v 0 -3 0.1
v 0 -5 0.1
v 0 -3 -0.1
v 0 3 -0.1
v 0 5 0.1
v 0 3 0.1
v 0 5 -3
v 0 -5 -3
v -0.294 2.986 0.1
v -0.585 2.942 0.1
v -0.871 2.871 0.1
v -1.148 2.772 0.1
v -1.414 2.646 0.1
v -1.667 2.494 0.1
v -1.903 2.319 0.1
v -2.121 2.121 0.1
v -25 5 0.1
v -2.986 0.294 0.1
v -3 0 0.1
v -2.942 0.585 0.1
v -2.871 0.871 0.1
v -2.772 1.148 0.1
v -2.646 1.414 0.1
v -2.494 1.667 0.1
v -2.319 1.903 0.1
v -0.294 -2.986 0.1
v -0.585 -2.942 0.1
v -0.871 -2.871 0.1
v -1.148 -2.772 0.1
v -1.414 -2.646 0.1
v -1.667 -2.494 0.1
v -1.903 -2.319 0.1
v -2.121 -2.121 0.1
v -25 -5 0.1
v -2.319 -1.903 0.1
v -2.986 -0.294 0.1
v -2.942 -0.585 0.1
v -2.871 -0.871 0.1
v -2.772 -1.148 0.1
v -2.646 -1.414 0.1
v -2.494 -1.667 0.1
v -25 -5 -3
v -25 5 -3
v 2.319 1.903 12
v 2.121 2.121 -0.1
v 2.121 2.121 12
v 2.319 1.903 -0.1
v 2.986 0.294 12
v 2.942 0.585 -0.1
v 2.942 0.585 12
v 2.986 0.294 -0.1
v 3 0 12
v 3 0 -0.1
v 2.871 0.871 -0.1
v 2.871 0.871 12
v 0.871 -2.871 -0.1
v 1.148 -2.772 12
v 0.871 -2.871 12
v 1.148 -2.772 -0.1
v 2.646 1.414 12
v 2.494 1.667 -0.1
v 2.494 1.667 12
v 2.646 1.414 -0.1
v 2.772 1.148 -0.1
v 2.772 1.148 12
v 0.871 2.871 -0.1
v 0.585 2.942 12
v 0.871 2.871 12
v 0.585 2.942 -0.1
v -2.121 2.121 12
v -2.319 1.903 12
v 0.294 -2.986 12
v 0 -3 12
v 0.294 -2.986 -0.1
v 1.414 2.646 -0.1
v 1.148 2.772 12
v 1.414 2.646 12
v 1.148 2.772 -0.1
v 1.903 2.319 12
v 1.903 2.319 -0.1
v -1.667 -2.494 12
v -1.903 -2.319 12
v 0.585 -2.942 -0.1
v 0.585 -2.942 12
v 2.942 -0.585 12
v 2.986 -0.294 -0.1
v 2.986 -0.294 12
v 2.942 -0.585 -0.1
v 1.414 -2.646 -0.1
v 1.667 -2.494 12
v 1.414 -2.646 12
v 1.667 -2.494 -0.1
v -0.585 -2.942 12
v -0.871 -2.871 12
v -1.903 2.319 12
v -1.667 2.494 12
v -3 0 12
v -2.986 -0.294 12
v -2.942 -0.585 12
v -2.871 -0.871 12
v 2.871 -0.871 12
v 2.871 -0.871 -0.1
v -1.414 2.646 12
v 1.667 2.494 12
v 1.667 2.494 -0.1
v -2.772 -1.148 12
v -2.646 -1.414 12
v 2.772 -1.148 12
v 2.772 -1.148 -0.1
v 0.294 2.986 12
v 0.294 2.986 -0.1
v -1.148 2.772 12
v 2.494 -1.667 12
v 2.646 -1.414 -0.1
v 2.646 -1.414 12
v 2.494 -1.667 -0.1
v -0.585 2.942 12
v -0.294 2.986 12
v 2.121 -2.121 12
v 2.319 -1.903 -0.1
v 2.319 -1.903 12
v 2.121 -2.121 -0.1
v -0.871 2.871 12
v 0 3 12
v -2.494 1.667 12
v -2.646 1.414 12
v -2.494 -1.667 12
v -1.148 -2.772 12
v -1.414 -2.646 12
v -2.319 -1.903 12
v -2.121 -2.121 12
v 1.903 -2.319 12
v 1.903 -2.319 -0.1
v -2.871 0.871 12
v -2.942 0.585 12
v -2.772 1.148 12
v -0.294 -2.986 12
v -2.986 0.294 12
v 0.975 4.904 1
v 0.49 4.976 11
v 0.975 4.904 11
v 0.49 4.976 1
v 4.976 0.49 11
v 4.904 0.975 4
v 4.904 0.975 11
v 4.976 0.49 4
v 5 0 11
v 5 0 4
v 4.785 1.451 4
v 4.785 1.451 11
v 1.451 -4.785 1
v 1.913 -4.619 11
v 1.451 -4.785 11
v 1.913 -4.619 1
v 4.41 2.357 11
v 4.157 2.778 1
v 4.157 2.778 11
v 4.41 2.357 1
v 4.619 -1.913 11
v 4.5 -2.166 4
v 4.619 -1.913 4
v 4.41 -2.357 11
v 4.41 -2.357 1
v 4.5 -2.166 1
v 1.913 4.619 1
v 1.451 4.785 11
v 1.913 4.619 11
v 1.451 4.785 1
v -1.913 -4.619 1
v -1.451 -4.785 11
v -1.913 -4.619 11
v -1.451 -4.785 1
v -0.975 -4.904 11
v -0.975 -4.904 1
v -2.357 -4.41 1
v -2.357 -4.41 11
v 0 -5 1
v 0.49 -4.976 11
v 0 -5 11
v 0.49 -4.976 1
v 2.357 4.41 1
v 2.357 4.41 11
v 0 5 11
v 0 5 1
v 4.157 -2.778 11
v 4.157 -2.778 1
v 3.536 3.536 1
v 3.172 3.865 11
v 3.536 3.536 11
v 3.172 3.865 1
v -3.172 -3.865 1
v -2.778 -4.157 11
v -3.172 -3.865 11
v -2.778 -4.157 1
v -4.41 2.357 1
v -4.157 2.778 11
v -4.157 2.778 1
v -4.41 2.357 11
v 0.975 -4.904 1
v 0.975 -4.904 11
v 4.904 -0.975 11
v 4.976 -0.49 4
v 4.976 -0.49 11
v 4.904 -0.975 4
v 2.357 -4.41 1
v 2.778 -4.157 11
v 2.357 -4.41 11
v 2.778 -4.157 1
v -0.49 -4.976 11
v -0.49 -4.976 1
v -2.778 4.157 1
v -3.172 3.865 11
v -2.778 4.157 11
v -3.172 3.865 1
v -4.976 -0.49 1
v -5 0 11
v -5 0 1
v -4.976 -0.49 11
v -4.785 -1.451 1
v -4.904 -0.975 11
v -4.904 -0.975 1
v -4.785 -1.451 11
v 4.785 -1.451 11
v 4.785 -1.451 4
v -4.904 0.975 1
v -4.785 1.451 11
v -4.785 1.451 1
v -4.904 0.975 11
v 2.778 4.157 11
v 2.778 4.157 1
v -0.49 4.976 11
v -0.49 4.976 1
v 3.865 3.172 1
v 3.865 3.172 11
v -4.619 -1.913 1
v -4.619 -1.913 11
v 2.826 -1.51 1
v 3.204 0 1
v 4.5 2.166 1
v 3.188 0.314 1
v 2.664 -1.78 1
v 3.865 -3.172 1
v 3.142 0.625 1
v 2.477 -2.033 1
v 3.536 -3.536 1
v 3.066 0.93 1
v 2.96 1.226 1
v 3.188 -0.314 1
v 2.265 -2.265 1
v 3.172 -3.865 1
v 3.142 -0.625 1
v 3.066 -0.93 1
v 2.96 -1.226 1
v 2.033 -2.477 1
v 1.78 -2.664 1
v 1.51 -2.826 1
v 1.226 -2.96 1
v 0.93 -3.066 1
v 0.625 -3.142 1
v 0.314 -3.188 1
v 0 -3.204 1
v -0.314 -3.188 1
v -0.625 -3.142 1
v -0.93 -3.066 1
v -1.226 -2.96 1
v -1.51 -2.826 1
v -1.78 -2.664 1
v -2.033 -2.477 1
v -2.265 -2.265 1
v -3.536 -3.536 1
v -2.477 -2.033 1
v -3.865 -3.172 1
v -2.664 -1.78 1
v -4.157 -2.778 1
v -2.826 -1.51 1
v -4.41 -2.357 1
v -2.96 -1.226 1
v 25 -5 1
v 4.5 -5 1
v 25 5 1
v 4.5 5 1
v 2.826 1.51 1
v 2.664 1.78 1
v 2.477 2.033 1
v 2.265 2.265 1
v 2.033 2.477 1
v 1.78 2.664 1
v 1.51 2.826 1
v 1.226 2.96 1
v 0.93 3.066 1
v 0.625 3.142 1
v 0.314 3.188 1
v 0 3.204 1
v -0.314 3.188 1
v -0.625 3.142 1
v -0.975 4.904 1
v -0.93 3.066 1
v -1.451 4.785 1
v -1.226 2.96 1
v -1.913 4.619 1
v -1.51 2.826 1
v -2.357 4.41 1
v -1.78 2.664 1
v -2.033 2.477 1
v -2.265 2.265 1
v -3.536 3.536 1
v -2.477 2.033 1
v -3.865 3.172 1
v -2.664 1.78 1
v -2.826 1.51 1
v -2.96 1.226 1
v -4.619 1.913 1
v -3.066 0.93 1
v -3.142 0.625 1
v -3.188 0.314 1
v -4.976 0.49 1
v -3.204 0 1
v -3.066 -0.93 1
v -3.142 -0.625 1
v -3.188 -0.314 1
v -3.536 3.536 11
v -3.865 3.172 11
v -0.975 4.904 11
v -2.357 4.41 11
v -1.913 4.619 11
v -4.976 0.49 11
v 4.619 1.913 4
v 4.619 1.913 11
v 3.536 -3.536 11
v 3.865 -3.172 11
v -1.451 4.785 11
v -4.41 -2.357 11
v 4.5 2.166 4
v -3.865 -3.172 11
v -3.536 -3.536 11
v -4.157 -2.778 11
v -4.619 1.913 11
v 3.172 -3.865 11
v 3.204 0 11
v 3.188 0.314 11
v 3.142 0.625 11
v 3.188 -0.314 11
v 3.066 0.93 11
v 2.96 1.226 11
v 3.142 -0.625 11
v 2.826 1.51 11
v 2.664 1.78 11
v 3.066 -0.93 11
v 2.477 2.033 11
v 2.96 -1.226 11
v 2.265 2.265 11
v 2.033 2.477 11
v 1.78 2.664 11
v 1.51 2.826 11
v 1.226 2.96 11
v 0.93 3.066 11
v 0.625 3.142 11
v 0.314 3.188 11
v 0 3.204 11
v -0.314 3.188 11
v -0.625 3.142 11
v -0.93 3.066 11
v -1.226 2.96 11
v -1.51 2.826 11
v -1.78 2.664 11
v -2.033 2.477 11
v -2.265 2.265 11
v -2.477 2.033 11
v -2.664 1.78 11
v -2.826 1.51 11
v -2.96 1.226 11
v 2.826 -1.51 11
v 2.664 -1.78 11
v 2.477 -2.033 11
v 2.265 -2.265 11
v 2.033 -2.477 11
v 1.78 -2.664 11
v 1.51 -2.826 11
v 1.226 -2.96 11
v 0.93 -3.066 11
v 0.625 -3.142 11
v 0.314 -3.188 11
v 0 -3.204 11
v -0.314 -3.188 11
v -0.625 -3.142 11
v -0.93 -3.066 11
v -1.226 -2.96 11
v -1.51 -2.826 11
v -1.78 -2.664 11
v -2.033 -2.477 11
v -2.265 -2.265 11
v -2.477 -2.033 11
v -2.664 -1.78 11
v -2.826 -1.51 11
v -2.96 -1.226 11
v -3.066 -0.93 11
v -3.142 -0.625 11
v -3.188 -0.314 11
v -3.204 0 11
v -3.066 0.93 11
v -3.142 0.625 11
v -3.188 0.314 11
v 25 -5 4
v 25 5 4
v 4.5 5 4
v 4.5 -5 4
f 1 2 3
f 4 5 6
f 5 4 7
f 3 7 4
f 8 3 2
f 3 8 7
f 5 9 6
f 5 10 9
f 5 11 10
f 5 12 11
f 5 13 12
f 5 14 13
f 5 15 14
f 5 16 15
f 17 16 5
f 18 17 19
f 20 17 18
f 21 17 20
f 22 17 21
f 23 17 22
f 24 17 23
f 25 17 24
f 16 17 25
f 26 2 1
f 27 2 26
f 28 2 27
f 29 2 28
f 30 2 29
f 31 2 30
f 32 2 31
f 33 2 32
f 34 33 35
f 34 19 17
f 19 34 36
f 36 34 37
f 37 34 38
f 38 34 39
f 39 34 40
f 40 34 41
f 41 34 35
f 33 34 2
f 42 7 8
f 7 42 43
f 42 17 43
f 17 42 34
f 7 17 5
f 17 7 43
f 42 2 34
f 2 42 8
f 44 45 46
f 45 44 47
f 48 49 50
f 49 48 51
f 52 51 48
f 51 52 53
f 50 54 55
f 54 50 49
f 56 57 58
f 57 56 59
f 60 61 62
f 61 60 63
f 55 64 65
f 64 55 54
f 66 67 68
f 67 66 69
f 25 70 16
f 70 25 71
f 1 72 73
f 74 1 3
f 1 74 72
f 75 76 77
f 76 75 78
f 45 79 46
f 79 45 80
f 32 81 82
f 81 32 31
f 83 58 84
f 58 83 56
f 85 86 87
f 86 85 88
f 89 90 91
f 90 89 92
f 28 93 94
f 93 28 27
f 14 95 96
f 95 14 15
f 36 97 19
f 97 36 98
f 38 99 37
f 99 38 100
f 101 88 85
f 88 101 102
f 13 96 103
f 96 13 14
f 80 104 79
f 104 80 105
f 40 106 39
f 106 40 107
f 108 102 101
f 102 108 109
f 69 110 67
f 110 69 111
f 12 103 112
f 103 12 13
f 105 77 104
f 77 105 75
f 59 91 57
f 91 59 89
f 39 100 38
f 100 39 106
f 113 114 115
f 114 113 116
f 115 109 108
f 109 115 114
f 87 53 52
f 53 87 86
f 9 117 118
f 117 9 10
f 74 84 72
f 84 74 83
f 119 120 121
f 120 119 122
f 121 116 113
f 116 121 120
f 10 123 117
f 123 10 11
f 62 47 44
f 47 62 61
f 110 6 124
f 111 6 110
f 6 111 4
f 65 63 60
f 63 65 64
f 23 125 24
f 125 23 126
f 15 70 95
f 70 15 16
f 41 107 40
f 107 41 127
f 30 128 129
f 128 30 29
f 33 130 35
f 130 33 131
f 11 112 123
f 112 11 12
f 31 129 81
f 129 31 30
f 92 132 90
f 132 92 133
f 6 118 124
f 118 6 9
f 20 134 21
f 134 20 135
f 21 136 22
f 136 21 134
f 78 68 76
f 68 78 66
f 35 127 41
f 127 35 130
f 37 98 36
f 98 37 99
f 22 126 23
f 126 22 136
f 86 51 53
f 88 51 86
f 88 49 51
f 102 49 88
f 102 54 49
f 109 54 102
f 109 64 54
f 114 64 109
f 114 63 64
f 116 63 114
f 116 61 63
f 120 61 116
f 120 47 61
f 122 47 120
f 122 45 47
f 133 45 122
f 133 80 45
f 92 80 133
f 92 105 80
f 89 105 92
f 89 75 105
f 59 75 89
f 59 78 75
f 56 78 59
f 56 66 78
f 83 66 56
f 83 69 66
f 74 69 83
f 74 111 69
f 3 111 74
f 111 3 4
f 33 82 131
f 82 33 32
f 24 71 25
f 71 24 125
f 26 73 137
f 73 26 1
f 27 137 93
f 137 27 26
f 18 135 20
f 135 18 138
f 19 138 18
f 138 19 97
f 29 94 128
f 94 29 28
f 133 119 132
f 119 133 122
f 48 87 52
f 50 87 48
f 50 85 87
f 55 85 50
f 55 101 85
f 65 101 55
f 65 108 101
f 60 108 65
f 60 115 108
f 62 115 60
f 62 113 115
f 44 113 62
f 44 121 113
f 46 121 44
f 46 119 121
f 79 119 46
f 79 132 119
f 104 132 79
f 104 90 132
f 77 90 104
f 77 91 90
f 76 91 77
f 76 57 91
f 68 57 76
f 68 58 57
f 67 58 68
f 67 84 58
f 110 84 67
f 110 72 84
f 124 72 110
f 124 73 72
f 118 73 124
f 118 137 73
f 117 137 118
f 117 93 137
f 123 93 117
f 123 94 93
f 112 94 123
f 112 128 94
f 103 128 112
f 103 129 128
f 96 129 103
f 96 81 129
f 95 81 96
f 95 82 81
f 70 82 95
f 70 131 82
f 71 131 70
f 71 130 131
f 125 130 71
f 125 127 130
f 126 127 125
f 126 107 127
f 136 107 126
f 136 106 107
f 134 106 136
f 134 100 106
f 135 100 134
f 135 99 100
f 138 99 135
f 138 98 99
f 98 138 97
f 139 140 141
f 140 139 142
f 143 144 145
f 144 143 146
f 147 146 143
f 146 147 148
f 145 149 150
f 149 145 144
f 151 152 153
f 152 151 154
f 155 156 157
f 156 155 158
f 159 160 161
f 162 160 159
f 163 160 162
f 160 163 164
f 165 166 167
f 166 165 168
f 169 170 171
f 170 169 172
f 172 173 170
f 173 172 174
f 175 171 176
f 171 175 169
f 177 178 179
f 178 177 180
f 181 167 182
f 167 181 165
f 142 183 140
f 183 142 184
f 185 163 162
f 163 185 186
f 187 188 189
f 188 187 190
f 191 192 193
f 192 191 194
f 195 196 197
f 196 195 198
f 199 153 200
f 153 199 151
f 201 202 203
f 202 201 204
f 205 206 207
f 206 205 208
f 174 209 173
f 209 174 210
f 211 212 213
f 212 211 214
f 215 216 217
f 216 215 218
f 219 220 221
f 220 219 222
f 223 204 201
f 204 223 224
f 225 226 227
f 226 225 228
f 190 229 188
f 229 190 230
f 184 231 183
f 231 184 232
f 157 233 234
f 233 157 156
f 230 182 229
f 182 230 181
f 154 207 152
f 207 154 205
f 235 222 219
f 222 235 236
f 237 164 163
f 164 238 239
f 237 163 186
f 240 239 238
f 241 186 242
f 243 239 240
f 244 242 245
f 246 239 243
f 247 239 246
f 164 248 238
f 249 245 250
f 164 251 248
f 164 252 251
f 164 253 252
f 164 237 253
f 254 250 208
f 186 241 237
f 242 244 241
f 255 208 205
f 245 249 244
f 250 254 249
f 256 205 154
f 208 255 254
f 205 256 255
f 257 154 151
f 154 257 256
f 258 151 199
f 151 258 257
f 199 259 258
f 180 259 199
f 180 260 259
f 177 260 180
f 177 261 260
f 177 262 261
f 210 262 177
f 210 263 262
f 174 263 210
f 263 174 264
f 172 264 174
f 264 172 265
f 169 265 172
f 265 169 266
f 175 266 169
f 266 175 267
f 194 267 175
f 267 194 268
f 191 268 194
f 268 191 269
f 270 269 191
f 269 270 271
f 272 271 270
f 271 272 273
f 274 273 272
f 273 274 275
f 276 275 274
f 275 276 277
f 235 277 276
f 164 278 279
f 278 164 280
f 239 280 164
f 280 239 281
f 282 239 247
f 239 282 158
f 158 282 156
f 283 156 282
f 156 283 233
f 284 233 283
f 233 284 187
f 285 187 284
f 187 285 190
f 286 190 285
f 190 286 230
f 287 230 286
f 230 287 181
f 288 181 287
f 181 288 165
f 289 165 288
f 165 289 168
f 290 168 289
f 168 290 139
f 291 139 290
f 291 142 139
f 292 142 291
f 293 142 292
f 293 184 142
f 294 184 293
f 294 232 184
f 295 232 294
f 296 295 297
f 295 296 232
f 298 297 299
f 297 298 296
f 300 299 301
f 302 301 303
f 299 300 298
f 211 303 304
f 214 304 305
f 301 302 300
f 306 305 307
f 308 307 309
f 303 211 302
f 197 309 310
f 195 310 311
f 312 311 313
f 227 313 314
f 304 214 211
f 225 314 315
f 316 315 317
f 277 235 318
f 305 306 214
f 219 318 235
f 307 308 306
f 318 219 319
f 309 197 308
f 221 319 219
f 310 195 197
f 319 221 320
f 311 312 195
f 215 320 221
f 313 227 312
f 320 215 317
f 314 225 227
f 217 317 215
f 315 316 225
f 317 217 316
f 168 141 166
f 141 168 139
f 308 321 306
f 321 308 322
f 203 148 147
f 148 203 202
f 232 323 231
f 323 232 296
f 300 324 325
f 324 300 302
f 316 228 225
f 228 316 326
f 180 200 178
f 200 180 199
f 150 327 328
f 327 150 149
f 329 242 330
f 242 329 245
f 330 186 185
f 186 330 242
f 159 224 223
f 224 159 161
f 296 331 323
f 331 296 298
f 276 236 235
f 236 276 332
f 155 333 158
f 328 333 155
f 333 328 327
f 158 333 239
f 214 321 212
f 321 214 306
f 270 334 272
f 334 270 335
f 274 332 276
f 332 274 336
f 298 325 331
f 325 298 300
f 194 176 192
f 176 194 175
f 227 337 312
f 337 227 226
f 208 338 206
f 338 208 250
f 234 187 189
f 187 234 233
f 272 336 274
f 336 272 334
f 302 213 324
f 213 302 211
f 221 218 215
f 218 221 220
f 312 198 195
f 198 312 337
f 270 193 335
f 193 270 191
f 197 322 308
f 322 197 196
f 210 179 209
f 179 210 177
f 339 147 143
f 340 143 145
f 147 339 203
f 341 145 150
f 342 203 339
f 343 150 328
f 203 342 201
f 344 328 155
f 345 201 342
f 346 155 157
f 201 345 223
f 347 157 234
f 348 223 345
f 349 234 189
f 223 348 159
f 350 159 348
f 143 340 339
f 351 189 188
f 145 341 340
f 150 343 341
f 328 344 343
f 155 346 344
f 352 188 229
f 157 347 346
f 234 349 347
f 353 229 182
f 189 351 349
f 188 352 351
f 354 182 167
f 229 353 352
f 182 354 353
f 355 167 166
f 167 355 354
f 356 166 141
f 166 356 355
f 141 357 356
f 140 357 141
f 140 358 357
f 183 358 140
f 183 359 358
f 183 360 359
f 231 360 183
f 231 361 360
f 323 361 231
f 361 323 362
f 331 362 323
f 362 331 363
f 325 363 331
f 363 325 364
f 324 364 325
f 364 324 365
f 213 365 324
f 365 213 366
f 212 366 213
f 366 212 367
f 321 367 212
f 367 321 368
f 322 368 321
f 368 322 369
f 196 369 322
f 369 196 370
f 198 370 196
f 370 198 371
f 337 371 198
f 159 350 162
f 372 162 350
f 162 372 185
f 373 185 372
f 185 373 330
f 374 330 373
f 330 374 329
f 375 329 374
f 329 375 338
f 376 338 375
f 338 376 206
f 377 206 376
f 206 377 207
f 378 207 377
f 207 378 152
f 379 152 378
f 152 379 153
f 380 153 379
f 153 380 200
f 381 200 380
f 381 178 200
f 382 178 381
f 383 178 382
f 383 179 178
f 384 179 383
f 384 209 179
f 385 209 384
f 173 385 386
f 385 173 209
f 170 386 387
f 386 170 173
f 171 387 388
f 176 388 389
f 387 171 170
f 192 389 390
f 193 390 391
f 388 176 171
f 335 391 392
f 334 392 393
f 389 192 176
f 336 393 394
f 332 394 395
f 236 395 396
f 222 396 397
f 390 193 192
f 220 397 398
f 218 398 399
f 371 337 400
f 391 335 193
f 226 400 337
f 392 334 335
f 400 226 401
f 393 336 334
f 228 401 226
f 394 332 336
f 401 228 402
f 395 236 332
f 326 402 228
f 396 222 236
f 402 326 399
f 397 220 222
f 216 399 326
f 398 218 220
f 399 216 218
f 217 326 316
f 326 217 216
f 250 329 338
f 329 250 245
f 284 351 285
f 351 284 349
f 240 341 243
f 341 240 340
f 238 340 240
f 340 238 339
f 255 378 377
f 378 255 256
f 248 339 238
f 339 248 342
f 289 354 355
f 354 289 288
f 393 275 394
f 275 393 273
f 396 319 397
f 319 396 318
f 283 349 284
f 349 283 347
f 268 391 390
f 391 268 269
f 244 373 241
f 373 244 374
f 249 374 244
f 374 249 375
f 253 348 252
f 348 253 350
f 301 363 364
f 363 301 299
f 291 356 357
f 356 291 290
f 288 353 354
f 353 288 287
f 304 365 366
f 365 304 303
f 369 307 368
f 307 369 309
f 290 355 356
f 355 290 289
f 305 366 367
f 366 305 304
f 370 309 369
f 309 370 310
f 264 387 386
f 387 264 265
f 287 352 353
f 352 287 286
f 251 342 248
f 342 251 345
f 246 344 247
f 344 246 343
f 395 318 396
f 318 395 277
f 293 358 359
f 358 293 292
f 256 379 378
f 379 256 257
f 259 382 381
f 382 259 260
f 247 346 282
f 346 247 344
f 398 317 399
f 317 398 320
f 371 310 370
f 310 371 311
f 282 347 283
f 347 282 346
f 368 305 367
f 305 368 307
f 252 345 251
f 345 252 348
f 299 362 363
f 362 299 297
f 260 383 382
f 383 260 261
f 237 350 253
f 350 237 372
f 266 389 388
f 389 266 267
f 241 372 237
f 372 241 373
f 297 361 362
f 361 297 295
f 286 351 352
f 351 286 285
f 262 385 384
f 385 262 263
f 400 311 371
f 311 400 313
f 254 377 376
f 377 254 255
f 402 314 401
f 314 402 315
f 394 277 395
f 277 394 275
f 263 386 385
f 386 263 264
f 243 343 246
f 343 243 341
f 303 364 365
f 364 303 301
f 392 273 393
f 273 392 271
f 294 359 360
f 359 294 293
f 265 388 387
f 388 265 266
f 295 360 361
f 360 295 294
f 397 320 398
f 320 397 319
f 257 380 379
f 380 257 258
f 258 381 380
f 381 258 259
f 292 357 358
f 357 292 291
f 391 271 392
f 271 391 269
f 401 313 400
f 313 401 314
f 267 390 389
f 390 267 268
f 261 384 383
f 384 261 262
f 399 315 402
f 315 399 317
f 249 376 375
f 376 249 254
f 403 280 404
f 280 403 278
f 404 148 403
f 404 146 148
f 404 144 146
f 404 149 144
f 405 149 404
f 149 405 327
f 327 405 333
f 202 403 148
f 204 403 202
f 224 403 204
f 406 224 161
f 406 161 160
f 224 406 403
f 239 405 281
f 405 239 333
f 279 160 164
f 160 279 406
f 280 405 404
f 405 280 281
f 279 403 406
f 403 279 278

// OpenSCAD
// Original two-piece test fixture. Units are millimetres.
// The loose axial joint needs external restraint in service; no retention is claimed.
agentscad_part = "all";
hinge_angle = 0;
$fn = 64;

module fixed_leaf() {
  union() {
    translate([-25, -5, -3]) cube([25, 10, 3.1]);
    translate([0, 0, -0.1]) cylinder(h = 12.1, d = 6);
  }
}

module moving_leaf() {
  union() {
    difference() {
      translate([0, 0, 1]) cylinder(h = 10, d = 10);
      translate([0, 0, 0.9]) cylinder(h = 10.2, d = 6.4 / cos(180 / $fn));
    }
    translate([4.5, -5, 1]) cube([20.5, 10, 3]);
  }
}

module generated_part() {
  if (agentscad_part == "all" || agentscad_part == "fixed") fixed_leaf();
  if (agentscad_part == "all") rotate([0, 0, hinge_angle]) moving_leaf();
  if (agentscad_part == "moving") moving_leaf();
}

generated_part();
